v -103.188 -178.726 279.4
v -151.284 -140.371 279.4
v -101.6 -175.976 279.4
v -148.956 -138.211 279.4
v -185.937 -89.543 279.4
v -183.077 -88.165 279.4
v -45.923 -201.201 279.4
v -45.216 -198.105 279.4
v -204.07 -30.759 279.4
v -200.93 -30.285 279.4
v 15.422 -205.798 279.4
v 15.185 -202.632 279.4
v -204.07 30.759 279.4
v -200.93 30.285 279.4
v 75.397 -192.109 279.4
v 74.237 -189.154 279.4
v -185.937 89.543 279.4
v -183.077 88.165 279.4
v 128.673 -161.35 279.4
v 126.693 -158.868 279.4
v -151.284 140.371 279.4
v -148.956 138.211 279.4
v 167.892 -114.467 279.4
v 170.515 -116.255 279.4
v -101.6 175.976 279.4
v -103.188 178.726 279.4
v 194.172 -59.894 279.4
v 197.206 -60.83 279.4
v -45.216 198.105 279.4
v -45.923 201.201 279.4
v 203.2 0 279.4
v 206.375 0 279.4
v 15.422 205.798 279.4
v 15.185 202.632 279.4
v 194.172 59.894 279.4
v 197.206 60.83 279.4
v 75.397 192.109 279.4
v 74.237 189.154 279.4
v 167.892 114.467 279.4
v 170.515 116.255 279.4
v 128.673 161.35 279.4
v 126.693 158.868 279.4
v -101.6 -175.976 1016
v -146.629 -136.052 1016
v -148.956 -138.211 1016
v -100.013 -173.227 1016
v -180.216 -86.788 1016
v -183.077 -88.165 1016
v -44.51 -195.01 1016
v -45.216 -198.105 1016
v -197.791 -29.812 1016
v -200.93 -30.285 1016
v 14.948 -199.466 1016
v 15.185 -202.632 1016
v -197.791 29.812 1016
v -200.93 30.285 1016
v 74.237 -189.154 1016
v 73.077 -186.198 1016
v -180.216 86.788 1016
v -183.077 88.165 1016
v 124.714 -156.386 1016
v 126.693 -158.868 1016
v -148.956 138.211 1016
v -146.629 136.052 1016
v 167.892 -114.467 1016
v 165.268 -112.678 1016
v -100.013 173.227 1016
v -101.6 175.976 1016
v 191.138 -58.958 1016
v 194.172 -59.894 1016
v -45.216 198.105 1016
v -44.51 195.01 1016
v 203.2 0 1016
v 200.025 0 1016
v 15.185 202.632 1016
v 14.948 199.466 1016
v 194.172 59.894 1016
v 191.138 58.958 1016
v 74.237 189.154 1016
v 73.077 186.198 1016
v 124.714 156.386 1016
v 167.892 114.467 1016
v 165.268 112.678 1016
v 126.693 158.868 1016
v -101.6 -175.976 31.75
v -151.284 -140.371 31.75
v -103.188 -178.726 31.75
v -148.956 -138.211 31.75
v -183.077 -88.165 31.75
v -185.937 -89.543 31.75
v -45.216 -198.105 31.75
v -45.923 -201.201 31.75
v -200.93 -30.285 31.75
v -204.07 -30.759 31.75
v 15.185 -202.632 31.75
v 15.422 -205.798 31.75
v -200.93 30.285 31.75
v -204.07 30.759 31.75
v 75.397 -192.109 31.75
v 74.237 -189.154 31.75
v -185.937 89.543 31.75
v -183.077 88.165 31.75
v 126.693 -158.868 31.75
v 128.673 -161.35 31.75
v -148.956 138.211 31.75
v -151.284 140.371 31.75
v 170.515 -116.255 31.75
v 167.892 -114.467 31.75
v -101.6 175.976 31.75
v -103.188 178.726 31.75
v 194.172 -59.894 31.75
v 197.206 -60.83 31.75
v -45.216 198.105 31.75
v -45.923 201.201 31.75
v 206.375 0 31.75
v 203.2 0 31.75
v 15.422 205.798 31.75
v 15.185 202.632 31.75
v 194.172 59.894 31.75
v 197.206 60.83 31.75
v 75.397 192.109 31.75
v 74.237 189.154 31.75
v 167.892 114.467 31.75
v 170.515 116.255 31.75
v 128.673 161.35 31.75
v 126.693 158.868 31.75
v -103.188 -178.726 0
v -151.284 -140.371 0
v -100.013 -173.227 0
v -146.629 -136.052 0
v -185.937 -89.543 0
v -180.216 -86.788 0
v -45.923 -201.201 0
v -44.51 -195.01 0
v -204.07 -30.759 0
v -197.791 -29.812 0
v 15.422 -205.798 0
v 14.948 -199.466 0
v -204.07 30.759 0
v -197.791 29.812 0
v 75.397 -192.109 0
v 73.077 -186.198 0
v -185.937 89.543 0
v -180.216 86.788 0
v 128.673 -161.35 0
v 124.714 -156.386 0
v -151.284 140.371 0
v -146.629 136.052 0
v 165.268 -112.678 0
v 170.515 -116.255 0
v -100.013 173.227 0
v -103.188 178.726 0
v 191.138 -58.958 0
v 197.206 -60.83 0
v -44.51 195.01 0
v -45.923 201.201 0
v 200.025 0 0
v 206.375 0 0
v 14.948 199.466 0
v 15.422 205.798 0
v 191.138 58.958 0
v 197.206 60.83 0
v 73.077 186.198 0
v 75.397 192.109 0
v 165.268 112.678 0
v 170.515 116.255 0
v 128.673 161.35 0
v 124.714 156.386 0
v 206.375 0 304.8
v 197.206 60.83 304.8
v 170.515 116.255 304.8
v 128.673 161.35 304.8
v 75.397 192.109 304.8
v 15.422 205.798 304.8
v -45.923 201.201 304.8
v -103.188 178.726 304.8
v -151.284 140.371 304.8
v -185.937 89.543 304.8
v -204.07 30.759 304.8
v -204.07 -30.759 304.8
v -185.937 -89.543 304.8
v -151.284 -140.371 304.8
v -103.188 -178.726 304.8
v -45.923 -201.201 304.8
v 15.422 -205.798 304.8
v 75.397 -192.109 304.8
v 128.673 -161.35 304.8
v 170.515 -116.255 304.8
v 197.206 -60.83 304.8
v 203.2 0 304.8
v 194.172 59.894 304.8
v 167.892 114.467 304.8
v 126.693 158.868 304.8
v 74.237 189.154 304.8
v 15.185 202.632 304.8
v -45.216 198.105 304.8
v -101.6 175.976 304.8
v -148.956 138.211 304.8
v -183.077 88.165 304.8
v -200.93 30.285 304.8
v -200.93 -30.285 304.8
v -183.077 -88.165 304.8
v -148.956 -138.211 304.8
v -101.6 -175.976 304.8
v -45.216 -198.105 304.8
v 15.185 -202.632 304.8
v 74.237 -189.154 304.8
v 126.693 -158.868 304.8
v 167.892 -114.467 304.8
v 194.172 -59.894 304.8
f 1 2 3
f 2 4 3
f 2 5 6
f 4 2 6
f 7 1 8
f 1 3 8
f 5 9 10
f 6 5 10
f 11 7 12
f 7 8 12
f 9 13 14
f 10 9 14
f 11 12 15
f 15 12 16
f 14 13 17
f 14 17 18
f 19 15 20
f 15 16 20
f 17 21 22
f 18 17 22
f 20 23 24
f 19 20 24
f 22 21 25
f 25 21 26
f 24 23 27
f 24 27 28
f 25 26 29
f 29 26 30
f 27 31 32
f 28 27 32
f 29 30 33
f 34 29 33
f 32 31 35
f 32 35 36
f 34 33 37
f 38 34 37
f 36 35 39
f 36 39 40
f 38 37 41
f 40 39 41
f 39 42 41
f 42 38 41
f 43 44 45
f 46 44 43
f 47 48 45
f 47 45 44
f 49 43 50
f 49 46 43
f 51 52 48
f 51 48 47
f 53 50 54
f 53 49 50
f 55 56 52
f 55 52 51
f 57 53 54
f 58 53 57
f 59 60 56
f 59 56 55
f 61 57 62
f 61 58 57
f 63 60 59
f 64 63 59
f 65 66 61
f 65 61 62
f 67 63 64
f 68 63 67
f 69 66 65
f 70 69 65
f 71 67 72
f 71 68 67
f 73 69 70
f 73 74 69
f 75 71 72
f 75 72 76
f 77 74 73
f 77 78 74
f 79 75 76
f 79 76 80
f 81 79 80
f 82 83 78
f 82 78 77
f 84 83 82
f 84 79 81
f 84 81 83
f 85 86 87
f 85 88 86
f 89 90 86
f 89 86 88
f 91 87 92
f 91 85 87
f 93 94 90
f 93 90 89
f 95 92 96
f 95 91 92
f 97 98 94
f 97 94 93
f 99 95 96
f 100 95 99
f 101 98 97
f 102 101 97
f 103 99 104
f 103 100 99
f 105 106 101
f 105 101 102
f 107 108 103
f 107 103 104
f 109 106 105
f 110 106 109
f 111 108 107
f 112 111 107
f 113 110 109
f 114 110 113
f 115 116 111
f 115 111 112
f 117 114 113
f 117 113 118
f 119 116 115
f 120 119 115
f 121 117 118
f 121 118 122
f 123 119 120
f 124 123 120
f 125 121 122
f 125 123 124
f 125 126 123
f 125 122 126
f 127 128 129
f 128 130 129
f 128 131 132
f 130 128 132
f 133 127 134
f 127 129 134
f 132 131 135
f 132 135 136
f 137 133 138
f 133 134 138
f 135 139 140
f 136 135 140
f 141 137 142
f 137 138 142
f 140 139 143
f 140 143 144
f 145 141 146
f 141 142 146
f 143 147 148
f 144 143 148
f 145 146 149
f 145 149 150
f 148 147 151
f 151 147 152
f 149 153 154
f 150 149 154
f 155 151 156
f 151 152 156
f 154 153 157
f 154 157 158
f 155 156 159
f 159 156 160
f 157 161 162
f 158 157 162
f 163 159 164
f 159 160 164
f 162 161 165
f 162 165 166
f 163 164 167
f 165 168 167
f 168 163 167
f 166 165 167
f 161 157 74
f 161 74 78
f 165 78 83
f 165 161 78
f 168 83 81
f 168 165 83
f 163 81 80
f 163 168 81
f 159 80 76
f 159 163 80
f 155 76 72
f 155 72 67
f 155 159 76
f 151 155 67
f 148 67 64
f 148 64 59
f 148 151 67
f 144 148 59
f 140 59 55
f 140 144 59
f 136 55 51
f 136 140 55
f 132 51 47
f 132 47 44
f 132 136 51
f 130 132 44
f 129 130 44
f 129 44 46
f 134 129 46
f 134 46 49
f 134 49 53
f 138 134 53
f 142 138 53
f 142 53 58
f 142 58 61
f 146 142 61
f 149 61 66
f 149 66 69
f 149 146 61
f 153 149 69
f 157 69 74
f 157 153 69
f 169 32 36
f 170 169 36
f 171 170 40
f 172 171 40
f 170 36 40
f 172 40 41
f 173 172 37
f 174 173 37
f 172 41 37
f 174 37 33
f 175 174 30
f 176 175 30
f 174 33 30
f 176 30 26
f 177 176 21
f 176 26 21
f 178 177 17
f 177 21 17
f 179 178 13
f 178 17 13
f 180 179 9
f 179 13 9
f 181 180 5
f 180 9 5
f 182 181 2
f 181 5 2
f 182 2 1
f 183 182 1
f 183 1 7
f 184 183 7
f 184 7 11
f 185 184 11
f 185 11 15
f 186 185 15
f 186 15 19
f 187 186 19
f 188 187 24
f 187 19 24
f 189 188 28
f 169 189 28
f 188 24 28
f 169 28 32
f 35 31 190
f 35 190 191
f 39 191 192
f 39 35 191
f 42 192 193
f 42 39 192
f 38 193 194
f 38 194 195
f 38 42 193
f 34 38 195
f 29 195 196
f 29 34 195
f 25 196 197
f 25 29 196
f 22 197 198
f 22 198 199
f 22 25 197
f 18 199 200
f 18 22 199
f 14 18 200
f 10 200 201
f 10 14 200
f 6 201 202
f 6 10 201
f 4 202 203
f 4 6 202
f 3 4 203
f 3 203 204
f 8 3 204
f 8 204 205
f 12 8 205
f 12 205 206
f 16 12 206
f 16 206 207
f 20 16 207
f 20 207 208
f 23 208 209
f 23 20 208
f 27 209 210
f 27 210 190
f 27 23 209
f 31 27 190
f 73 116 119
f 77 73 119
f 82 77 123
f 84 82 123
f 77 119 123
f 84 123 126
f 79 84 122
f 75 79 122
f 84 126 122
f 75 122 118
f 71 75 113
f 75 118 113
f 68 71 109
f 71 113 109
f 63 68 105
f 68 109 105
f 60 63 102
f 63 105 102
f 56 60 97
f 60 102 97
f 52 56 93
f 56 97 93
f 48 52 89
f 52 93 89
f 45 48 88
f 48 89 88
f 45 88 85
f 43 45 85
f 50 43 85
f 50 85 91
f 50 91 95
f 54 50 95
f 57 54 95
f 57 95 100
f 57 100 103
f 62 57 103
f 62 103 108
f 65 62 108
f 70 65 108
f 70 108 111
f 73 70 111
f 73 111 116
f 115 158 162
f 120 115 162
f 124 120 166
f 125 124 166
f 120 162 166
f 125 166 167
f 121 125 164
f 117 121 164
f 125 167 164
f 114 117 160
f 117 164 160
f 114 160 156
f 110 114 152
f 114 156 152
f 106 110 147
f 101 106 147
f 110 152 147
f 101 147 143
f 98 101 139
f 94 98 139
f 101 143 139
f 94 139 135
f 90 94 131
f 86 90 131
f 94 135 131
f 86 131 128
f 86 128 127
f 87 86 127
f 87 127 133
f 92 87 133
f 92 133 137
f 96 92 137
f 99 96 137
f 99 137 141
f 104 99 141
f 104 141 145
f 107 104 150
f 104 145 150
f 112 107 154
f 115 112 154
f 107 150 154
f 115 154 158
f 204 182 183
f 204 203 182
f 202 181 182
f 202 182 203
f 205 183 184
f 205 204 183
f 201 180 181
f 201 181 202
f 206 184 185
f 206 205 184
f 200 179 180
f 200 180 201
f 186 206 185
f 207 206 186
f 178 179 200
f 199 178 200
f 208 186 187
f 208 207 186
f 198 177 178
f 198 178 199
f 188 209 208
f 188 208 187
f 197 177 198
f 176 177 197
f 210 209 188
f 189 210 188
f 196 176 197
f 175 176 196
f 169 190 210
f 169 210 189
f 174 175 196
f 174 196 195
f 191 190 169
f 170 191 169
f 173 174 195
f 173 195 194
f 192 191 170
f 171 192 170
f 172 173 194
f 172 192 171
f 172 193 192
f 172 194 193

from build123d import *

# Parameters (mm, degrees)
F0_R     = 203.2
F0_R_2   = 200.025
F1_DEPTH = 1016
F0_R_3   = 206.375
F2_DEPTH = 31.75
F5_R     = 206.375
F5_R_2   = 203.2
F6_DEPTH = 25.4


with BuildPart() as f1:
    # F0 (on Top) → F1 (new body)
    with BuildSketch(Plane.XY):
        Circle(F0_R)
        Circle(F0_R_2, mode=Mode.SUBTRACT)
    extrude(amount=F1_DEPTH)

    # F0 (on Top) → F2 (join)
    with BuildSketch(Plane.XY):
        Circle(F0_R_3)
        Circle(F0_R, mode=Mode.SUBTRACT)
    extrude(amount=F2_DEPTH)


with BuildPart() as f6:
    # F5 (on face) → F6 (new body)
    with BuildSketch(Plane.XY.offset(279.4)):
        Circle(F5_R)
        Circle(F5_R_2, mode=Mode.SUBTRACT)
    extrude(amount=F6_DEPTH)


solid = Compound([f1.part, f6.part])
